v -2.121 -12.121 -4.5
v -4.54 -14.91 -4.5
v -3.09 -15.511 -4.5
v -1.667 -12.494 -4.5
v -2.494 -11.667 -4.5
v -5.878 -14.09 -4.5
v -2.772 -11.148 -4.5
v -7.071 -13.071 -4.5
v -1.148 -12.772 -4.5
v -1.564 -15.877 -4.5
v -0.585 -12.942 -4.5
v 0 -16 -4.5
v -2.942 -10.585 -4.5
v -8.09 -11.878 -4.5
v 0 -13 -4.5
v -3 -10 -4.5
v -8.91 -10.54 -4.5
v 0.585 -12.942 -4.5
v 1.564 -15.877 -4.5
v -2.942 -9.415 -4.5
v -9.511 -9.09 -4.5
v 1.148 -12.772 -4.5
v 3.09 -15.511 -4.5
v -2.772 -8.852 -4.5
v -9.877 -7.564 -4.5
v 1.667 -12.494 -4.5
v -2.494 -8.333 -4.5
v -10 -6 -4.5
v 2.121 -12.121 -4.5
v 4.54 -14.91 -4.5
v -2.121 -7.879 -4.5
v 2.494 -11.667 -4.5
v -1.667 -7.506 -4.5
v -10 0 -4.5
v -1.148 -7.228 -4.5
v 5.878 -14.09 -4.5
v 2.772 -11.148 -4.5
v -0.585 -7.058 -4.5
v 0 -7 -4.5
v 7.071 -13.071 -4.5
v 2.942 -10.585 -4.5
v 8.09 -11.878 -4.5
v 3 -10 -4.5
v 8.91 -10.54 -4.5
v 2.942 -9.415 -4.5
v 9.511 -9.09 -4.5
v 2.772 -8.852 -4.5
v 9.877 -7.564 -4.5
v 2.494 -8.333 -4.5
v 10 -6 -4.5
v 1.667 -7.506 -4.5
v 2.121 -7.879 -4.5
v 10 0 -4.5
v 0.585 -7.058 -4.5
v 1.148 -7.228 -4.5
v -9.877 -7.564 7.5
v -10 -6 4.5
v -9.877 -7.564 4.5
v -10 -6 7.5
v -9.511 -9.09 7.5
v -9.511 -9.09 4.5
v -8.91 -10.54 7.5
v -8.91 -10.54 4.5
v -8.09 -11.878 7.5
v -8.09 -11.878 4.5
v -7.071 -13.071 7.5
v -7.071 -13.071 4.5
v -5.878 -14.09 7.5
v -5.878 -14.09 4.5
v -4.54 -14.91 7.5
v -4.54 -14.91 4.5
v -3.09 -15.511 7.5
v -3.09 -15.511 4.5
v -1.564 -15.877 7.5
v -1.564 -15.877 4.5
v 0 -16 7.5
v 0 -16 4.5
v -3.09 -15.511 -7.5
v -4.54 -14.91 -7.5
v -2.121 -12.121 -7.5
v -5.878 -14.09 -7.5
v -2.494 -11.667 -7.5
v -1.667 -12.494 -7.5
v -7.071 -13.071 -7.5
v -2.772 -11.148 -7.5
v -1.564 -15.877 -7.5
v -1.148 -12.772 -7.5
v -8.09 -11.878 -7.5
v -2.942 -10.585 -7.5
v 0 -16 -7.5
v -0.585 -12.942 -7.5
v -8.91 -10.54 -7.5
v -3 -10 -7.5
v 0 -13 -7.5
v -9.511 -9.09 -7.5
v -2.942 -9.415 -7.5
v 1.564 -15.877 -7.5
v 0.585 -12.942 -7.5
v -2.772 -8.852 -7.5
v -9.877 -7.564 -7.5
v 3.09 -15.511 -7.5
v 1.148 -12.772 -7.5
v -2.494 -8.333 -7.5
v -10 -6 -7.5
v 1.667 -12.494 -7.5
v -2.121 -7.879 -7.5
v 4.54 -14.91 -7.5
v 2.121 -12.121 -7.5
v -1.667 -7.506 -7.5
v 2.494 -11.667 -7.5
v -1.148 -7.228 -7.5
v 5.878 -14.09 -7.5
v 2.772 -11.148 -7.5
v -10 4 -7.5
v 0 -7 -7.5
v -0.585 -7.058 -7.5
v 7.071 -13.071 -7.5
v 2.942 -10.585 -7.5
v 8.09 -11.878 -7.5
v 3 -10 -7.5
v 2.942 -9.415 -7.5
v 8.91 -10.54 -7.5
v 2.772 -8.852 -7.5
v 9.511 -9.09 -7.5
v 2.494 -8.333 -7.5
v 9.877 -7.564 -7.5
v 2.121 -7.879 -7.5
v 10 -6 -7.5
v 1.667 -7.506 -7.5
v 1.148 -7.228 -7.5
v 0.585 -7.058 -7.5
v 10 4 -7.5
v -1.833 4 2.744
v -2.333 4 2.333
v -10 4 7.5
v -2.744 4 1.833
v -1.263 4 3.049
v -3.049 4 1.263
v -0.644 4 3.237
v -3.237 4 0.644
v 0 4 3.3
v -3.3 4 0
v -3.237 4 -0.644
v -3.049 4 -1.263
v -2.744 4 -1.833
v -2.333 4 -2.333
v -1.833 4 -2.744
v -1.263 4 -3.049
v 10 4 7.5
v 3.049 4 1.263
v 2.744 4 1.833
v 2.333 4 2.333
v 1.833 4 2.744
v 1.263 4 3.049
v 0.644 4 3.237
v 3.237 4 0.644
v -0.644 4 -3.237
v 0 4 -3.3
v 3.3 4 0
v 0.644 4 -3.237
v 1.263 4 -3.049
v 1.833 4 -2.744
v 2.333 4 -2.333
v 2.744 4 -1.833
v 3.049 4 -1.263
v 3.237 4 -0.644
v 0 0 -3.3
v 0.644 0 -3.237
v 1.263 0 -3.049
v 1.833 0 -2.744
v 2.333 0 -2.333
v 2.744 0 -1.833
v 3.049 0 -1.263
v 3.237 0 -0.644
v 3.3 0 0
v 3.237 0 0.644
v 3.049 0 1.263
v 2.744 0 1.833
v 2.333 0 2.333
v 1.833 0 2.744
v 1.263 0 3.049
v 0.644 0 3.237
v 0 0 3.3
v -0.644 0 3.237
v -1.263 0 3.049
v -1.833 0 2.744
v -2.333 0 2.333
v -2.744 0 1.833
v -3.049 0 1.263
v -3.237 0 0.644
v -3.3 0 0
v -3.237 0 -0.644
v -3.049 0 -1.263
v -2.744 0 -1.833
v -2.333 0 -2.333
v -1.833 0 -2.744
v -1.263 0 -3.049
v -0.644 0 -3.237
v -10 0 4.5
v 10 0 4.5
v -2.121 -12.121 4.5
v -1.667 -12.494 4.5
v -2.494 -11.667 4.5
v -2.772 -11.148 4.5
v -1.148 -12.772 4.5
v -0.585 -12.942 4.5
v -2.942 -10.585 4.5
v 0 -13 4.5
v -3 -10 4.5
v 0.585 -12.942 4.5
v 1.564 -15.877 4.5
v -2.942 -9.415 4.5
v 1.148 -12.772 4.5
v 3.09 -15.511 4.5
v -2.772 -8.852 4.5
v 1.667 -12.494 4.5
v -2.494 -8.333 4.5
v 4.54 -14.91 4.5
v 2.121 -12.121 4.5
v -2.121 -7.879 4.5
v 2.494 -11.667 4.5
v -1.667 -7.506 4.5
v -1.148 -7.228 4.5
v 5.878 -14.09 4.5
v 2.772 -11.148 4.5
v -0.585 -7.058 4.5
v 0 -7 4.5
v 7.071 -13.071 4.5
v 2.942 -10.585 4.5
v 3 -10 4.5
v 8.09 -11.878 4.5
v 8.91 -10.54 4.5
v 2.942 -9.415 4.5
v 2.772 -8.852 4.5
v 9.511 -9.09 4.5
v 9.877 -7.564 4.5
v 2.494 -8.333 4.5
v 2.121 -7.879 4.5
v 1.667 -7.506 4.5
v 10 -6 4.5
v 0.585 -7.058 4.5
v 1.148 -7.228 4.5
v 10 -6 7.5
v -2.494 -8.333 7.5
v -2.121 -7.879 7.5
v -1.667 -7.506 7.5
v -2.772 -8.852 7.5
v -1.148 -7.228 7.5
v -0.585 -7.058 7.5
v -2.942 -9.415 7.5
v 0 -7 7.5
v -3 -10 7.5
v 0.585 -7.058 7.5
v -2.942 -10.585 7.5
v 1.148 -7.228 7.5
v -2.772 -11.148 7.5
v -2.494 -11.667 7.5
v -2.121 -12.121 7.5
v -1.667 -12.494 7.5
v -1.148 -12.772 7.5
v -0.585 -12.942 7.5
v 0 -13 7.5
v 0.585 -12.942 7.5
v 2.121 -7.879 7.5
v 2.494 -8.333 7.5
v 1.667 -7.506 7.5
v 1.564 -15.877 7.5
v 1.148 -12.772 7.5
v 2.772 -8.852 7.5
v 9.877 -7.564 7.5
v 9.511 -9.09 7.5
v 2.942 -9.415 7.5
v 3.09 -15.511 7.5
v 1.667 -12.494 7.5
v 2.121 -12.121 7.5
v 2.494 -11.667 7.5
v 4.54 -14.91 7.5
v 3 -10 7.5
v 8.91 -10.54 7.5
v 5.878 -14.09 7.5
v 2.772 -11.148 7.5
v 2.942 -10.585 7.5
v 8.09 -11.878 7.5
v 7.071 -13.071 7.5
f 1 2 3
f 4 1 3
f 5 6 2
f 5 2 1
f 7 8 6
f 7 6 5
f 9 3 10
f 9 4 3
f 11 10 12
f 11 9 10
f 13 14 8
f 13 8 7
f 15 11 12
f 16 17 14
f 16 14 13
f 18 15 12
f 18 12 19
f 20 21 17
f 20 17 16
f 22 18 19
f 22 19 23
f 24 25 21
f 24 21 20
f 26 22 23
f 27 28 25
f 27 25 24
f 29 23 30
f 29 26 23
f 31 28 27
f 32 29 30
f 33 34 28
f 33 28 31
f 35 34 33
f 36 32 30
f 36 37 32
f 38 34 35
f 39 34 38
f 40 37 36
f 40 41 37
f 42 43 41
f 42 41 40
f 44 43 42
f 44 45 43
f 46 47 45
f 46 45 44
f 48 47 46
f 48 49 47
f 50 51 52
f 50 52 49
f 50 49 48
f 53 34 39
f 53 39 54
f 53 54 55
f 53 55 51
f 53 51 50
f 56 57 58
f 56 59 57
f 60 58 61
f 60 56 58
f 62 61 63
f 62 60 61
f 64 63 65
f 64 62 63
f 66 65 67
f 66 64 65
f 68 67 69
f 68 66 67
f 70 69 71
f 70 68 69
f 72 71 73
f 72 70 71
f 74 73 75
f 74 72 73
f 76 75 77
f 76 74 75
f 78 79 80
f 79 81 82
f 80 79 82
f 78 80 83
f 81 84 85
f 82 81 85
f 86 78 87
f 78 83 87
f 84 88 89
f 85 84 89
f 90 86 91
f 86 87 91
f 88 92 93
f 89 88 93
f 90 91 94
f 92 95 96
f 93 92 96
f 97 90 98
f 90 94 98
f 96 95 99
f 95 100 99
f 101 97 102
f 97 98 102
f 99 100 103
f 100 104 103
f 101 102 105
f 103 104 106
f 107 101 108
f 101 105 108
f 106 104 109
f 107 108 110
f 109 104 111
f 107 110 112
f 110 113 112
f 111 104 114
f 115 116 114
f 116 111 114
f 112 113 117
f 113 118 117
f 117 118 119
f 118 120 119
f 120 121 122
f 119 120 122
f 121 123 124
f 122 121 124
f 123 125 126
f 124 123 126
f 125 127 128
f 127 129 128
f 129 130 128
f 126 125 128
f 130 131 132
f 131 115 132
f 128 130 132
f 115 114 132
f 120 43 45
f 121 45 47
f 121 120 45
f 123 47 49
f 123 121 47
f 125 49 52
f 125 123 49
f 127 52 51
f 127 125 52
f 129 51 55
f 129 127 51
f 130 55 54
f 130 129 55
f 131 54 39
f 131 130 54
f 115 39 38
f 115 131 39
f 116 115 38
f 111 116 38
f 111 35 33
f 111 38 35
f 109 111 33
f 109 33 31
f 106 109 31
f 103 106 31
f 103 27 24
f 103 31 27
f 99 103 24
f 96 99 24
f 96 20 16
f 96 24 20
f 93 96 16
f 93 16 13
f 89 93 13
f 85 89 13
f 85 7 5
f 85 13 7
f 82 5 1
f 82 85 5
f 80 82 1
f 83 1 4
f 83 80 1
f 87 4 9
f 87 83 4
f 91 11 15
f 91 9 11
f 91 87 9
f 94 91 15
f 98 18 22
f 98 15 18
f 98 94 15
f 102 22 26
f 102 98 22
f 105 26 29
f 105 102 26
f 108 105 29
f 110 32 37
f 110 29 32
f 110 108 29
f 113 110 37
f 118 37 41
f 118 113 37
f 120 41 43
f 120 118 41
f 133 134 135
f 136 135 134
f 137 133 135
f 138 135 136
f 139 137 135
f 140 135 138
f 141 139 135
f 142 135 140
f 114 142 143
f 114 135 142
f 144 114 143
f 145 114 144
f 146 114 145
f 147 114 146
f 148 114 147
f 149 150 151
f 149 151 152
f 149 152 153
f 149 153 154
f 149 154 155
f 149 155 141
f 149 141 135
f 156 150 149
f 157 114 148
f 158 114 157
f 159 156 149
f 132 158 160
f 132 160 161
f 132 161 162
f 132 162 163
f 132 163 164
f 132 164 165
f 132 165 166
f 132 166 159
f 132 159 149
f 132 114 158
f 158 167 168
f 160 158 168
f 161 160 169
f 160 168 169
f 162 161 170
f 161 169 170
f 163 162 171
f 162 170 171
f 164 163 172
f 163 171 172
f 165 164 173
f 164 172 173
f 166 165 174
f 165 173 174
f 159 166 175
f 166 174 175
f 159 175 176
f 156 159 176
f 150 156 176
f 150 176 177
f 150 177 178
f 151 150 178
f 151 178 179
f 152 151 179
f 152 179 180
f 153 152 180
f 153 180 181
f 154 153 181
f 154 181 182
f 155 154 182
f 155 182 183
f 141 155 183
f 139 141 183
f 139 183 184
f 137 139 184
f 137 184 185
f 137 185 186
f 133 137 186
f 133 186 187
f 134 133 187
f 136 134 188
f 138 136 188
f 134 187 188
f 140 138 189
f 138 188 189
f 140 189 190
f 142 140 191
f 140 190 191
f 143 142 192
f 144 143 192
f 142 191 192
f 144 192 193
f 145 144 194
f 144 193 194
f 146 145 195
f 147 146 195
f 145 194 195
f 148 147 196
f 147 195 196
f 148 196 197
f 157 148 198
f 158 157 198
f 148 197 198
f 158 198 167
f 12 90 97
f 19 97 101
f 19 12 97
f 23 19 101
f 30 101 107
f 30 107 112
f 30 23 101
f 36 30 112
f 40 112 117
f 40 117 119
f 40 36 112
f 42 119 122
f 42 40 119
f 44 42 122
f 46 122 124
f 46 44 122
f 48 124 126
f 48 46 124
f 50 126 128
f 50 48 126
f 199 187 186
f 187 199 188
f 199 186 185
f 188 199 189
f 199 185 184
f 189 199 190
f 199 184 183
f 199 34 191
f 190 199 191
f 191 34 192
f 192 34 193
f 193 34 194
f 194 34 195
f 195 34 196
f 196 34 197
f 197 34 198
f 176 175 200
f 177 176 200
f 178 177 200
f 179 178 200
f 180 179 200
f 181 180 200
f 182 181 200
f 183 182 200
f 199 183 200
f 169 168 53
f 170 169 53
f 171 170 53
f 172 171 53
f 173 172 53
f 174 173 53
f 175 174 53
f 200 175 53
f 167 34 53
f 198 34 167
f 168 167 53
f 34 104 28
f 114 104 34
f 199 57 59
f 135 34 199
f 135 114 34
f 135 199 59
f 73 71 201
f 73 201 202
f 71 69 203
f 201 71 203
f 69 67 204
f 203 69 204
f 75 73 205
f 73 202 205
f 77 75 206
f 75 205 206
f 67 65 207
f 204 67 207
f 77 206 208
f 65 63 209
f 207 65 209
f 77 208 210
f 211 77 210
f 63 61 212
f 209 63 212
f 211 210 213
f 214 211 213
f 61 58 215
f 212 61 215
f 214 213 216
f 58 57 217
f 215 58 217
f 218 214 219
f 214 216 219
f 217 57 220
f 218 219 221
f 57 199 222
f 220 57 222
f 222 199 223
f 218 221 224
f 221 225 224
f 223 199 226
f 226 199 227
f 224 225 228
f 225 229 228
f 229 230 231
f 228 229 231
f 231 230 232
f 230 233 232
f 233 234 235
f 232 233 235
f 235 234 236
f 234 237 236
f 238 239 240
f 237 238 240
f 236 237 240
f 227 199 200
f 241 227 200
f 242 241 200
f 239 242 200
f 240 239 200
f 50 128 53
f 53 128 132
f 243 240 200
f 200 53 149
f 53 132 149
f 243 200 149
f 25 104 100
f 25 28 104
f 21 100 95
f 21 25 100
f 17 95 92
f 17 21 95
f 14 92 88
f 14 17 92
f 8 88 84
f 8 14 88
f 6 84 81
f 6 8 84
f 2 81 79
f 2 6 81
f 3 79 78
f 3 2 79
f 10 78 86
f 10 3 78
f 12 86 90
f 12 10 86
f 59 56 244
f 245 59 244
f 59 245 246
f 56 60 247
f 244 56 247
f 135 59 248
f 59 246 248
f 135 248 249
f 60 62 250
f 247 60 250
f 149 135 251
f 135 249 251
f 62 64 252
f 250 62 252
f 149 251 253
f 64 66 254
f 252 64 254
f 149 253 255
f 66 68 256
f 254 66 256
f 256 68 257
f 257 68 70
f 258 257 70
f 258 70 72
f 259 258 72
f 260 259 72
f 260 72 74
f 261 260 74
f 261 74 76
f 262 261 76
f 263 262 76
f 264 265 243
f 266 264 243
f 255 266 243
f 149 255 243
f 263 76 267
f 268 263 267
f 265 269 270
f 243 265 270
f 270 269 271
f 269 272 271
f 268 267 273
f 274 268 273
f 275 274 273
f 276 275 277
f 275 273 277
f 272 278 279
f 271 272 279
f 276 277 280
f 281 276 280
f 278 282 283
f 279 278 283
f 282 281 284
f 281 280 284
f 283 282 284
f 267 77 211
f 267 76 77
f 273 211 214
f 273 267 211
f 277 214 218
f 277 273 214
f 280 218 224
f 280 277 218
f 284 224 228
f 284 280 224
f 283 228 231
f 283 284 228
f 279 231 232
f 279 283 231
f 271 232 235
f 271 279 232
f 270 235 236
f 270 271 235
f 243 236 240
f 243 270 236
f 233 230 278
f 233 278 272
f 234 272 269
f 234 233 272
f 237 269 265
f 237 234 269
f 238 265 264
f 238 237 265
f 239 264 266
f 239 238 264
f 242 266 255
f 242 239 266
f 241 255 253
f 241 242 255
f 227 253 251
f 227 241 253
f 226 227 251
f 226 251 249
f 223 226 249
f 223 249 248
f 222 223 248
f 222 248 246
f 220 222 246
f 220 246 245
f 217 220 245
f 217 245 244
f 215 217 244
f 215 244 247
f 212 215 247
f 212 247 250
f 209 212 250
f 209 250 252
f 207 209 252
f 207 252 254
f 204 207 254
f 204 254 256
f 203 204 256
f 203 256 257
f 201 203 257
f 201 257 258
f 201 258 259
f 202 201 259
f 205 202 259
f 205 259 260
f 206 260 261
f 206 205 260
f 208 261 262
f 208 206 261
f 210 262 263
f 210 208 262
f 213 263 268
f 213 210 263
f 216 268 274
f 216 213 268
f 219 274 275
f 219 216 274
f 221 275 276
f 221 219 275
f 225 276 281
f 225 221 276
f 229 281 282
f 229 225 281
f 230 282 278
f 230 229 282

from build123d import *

# Parameters (mm, degrees)
SKETCH1_W                = 20
SKETCH1_H                = 15
BOSS_EXTRUDE1_DEPTH      = 4
SKETCH3_W                = 20
SKETCH3_H                = 3
BOSS_EXTRUDE2_DEPTH      = 16
M6_CLEARANCE_HOLE1_D     = 6.6
M6_CLEARANCE_HOLE1_DEPTH = 8
M6_CLEARANCE_HOLE1_TIP   = 1.982840043
SKETCH6_R                = 3
CUT_EXTRUDE1_DEPTH       = 15
FILLET1_R                = 10


with BuildPart() as part:
    # Sketch1 → Boss-Extrude1 (new body)
    with BuildSketch(Plane(origin=(0, 0, 0), x_dir=(1, 0, 0), z_dir=(0, 1, 0))):
        Rectangle(SKETCH1_W, SKETCH1_H)
    extrude(amount=BOSS_EXTRUDE1_DEPTH)

    # Sketch3 → Boss-Extrude2 (add)
    with BuildSketch(Plane.XZ):
        with Locations((0, -6)):
            Rectangle(SKETCH3_W, SKETCH3_H)
        with Locations((0, 6)):
            Rectangle(SKETCH3_W, SKETCH3_H)
    extrude(amount=BOSS_EXTRUDE2_DEPTH)

    # M6 Clearance Hole1
    with Locations(Plane.ZX.offset(4)):
        with Locations((0, 0)):
            Hole(M6_CLEARANCE_HOLE1_D / 2, depth=M6_CLEARANCE_HOLE1_DEPTH)
            with Locations((0, 0, -(M6_CLEARANCE_HOLE1_DEPTH + M6_CLEARANCE_HOLE1_TIP / 2))):  # 118° drill point
                Cone(0, M6_CLEARANCE_HOLE1_D / 2, M6_CLEARANCE_HOLE1_TIP, mode=Mode.SUBTRACT)

    # Sketch6 → Cut-Extrude1 (cut)
    with BuildSketch(Plane.XY.offset(-7.5)):
        with Locations((0, -10)):
            Circle(SKETCH6_R)
    extrude(amount=CUT_EXTRUDE1_DEPTH, mode=Mode.SUBTRACT)

    # Fillet1
    fillet1_edges = [part.edges().sort_by_distance(p)[0] for p in [
        (10, -16, -6),
        (10, -16, 6),
        (-10, -16, 6),
        (-10, -16, -6),
    ]]
    fillet(fillet1_edges, radius=FILLET1_R - 0.0001)  # a hair under: the kernel refuses the full size


solid = part.part
